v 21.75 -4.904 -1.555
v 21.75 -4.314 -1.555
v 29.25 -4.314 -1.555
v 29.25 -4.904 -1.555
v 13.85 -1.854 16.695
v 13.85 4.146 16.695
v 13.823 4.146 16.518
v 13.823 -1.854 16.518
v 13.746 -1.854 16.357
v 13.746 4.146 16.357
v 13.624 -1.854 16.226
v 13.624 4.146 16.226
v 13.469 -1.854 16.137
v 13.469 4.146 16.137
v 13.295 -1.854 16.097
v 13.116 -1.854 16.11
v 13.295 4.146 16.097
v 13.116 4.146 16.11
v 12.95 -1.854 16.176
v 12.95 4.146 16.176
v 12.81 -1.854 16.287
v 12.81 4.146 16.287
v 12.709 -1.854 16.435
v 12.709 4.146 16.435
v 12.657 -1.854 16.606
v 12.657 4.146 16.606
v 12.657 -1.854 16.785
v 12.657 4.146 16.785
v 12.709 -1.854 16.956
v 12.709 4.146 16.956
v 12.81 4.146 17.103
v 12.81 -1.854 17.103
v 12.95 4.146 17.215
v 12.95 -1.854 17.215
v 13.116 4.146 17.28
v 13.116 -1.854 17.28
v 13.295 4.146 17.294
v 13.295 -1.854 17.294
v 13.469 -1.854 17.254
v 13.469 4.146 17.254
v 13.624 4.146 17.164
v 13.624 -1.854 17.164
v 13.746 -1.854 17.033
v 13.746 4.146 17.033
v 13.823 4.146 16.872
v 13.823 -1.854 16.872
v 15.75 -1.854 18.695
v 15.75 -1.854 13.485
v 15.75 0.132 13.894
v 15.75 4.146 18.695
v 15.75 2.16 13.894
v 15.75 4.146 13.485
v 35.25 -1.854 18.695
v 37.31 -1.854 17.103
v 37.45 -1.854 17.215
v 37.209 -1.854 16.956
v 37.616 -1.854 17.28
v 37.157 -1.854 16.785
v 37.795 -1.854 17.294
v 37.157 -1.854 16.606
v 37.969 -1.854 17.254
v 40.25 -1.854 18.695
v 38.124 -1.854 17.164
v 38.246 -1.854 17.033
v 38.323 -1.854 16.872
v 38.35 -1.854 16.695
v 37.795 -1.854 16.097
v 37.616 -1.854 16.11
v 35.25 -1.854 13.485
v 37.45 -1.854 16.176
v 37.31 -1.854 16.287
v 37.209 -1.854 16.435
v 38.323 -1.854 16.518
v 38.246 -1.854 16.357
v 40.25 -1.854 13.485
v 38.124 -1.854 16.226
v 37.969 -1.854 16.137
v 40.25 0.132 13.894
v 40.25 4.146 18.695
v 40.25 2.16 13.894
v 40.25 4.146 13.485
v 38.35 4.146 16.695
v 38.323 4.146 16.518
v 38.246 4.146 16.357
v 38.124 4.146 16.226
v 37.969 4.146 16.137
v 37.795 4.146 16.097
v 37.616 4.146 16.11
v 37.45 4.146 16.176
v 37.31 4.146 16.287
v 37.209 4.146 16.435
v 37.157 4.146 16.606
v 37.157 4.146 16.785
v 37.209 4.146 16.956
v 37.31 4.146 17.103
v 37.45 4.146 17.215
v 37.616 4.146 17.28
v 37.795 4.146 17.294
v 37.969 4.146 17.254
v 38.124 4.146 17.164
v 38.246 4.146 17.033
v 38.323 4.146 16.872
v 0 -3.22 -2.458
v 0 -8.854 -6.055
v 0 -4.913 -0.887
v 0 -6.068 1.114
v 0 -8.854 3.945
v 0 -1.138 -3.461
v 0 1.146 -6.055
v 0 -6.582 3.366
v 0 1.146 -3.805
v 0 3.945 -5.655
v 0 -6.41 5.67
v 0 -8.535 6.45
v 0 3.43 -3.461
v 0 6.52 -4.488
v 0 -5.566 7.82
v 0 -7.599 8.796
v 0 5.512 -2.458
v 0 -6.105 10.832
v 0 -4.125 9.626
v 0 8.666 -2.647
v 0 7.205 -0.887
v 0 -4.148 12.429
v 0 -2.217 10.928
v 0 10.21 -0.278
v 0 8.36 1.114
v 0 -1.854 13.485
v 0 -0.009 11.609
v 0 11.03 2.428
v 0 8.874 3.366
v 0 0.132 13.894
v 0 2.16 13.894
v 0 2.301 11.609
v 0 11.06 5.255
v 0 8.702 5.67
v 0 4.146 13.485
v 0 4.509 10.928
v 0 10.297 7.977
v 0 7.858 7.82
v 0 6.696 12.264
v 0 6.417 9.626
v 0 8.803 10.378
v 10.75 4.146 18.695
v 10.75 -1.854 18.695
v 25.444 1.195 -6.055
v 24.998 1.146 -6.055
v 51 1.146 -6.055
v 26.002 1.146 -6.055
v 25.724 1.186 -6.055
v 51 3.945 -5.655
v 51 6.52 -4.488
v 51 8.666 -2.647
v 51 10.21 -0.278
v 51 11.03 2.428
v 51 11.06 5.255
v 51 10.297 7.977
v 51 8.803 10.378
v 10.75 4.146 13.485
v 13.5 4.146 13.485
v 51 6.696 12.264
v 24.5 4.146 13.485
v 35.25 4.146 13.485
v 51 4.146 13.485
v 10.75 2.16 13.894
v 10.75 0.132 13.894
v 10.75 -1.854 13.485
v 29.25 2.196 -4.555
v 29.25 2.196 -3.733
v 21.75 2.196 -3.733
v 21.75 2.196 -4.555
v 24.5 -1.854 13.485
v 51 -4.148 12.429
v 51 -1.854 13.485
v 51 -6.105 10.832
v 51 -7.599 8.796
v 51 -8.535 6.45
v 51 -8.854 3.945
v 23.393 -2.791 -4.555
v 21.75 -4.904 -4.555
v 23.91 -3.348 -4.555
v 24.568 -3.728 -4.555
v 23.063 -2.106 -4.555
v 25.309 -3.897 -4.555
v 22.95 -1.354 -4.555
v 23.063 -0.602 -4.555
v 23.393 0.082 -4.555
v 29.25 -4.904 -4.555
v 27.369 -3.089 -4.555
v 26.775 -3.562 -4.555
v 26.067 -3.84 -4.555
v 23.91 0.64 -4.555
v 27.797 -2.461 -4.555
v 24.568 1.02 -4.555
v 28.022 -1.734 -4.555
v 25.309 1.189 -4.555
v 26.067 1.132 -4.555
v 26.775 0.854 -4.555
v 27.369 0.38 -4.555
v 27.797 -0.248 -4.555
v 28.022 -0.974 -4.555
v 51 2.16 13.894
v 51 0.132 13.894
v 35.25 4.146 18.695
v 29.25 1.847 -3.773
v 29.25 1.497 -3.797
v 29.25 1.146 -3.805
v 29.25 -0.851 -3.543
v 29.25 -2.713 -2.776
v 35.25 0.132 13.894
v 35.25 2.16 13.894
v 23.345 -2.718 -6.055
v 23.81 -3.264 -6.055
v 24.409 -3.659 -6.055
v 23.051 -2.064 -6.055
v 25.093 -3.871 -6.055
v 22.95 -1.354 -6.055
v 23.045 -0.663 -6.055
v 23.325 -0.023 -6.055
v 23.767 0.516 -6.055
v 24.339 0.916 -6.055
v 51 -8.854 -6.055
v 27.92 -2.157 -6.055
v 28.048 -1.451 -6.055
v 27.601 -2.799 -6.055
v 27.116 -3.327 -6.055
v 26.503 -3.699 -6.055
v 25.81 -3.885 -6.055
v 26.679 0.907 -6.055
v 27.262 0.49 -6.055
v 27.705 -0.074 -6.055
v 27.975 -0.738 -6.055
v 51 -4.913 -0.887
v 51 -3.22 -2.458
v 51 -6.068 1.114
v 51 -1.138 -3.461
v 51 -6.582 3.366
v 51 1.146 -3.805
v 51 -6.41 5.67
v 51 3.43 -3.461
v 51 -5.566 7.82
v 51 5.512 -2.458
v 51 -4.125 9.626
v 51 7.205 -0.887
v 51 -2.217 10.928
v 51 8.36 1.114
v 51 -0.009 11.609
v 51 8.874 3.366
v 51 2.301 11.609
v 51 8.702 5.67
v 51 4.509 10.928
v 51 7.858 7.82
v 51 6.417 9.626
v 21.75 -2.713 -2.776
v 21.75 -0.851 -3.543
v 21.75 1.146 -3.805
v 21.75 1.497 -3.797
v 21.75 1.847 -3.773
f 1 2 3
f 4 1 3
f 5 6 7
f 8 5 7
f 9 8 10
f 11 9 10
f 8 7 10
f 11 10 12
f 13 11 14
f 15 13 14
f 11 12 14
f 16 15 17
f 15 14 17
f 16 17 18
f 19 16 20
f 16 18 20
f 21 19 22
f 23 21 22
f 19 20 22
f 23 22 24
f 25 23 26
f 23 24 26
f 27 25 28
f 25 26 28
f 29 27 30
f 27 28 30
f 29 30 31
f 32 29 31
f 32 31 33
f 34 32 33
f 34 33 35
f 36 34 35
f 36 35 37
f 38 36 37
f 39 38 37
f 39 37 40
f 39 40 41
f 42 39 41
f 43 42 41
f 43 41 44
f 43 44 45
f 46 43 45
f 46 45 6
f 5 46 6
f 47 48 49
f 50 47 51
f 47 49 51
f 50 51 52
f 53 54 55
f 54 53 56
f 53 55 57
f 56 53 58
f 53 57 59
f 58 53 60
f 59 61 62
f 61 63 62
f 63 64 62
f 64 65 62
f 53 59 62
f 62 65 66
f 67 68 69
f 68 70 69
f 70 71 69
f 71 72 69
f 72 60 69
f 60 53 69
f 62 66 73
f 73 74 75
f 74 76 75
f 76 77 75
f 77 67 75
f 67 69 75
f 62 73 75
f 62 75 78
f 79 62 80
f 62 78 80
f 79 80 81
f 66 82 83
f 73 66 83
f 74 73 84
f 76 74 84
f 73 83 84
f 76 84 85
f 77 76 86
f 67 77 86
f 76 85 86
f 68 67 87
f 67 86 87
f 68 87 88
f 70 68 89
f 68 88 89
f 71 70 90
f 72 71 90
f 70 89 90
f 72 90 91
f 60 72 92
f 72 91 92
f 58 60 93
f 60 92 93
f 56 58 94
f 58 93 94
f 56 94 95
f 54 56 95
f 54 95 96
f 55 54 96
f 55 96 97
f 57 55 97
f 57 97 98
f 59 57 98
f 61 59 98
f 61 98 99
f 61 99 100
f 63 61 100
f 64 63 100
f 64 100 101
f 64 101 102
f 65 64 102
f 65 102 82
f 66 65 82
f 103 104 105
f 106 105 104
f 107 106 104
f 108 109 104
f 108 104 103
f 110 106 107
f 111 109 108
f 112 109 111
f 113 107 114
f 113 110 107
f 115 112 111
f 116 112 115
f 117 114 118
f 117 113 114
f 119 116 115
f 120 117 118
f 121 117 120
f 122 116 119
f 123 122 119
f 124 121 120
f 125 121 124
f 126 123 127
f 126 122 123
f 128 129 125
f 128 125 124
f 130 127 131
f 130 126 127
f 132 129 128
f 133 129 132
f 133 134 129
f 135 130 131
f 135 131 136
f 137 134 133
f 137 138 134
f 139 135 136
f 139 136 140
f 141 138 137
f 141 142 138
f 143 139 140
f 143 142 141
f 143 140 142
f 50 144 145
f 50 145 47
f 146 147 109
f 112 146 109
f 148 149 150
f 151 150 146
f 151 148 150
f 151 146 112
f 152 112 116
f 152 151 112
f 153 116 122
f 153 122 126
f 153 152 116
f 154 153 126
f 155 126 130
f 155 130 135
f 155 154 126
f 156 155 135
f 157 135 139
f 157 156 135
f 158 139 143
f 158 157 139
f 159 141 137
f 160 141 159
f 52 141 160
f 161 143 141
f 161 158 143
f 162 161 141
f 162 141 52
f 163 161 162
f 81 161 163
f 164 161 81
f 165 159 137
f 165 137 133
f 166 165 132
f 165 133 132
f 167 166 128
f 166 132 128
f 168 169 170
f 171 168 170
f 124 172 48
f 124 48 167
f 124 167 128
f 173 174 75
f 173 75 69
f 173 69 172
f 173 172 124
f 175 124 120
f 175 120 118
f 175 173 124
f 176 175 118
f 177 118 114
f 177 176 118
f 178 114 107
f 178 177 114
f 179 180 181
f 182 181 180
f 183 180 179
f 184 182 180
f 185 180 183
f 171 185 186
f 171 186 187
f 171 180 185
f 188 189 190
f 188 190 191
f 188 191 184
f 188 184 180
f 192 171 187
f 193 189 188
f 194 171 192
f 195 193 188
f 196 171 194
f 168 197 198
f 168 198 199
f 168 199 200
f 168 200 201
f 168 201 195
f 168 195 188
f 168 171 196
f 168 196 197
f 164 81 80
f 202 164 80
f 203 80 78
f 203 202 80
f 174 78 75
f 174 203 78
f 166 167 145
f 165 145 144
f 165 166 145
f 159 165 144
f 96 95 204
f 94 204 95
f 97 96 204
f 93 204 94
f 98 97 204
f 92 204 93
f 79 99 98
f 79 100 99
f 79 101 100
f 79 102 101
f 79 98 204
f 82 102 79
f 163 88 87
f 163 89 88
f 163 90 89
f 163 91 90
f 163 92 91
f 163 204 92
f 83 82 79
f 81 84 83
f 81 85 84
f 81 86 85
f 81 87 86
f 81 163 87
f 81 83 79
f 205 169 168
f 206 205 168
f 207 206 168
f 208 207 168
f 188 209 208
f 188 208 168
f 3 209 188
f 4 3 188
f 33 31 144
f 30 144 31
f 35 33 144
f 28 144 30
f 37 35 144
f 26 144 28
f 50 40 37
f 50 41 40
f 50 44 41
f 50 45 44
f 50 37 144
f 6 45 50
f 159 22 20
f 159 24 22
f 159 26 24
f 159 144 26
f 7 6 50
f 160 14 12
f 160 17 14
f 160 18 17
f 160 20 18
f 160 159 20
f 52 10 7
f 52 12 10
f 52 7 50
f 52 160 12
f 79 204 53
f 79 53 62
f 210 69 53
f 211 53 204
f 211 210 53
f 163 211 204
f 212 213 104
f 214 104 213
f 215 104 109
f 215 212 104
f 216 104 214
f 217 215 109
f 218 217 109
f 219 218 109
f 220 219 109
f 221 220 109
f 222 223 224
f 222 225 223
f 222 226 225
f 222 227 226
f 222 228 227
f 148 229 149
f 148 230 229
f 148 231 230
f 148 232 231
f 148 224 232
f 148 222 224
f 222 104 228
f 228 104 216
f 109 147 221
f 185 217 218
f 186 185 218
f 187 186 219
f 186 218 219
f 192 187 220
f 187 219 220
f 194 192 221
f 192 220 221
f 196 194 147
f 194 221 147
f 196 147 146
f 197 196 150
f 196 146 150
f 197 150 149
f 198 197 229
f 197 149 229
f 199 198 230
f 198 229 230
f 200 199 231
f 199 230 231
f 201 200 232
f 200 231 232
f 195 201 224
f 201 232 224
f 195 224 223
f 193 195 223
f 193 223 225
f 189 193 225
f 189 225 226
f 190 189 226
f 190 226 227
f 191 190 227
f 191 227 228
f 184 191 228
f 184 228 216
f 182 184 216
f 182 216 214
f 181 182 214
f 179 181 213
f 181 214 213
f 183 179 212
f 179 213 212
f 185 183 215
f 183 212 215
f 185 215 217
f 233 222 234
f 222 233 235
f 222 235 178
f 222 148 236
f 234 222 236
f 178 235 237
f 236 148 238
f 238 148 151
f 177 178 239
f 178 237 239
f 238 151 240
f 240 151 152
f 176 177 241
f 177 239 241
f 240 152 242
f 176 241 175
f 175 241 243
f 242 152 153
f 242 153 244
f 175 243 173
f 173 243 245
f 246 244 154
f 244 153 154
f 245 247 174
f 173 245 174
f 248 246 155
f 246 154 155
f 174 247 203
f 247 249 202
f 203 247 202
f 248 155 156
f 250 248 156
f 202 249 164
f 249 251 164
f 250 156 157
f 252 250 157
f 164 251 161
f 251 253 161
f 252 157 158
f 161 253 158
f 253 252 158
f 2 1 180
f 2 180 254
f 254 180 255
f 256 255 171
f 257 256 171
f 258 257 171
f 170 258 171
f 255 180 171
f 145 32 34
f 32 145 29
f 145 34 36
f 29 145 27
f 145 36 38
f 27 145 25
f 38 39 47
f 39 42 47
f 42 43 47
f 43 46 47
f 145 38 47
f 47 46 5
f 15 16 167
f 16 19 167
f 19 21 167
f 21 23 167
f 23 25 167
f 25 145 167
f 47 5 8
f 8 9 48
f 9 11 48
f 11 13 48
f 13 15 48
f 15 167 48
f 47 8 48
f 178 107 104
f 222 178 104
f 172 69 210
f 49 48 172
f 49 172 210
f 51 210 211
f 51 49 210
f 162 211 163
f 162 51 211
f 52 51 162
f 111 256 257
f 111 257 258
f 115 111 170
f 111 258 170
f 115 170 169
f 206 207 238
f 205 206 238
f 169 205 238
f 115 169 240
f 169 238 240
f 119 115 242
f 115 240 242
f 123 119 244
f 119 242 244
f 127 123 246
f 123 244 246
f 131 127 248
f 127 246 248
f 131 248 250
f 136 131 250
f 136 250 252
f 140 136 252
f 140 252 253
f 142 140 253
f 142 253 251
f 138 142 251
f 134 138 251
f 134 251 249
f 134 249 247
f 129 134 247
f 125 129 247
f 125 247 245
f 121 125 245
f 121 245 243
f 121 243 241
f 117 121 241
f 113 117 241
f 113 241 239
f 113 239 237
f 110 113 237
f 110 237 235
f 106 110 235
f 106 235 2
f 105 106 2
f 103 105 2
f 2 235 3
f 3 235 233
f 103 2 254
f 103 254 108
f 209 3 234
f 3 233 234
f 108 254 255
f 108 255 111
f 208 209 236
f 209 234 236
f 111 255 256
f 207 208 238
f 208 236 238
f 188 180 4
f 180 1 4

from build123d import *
from build123d.topology import SkipClean

# Parameters (mm, degrees)
SKETCH1_W                = 34
SKETCH1_H                = 30
BOSS_EXTRUDE2_DEPTH      = 51
SKETCH3_R                = 2.55
CUT_EXTRUDE3_DEPTH       = 10
SKETCH5_R                = 7.75
CUT_EXTRUDE4_DEPTH       = 51
SKETCH6_W                = 7
SKETCH6_H                = 30
CUT_EXTRUDE6_DEPTH       = 51
CUT_EXTRUDE7_DEPTH       = 51
CUT_EXTRUDE9_DEPTH       = 1.5
CUT_EXTRUDE9_DEPTH_BACK  = 1.5
BOSS_EXTRUDE5_DEPTH      = 51
CUT_EXTRUDE10_DEPTH      = 13
CUT_EXTRUDE11_START      = -13
CUT_EXTRUDE11_DEPTH      = 13
SKETCH13_W               = 2
SKETCH13_H               = 6
CUT_EXTRUDE12_DEPTH      = 2
CUT_EXTRUDE13_DEPTH      = 13
CUT_EXTRUDE13_DEPTH_BACK = 11
BOSS_EXTRUDE6_DEPTH      = 2.25
BOSS_EXTRUDE7_DEPTH      = 2.25
BOSS_EXTRUDE8_DEPTH      = 2.25
BOSS_EXTRUDE9_DEPTH      = 2.25
SKETCH22_W               = 5
SKETCH22_H               = 6
BOSS_EXTRUDE10_DEPTH     = 1
SKETCH24_W               = 5
SKETCH24_H               = 6
BOSS_EXTRUDE11_DEPTH     = 1
SKETCH25_R               = 0.6
CUT_EXTRUDE14_DEPTH      = 20


with BuildPart() as part:
    # Sketch1 → Boss-Extrude2 (new body)
    with BuildSketch(Plane(origin=(0, 0, 0), x_dir=(0, 0, -1), z_dir=(1, 0, 0))):
        with Locations((-3.945183177, 6.145902028)):
            Rectangle(SKETCH1_W, SKETCH1_H)
    extrude(amount=BOSS_EXTRUDE2_DEPTH)

    # Sketch3 → Cut-Extrude3 (cut)
    with BuildSketch(Plane(origin=(0, 0, -13.054816823), x_dir=(-1, 0, 0), z_dir=(0, 0, -1))):
        with Locations((-25.5, -1.354097972)):
            Circle(SKETCH3_R)
    extrude(amount=-CUT_EXTRUDE3_DEPTH, mode=Mode.SUBTRACT)

    # Sketch5 → Cut-Extrude4 (cut)
    with BuildSketch(Plane(origin=(51, 0, 0), x_dir=(0, 0, -1), z_dir=(1, 0, 0))):
        with Locations((-3.945183177, 1.145902028)):
            Circle(SKETCH5_R)
    extrude(amount=-CUT_EXTRUDE4_DEPTH, mode=Mode.SUBTRACT)

    # Sketch6 → Cut-Extrude6 (cut)
    with BuildSketch(Plane(origin=(51, 0, 0), x_dir=(0, 0, -1), z_dir=(1, 0, 0))):
        with Locations((9.554816823, 6.145902028)):
            Rectangle(SKETCH6_W, SKETCH6_H)
    extrude(amount=-CUT_EXTRUDE6_DEPTH, mode=Mode.SUBTRACT)

    # Sketch7 → Cut-Extrude7 (cut)
    with BuildSketch(Plane(origin=(51, 0, 0), x_dir=(0, 0, -1), z_dir=(1, 0, 0))):
        with BuildLine():
            Line((-3.945183177, -8.854097972), (-20.945183177, -8.854097972))
            Line((-20.945183177, -8.854097972), (-20.945183177, 21.145902028))
            Line((-20.945183177, 21.145902028), (6.054816823, 21.145902028))
            Line((6.054816823, 21.145902028), (6.054816823, 1.145902028))
            ThreePointArc((6.054816823, 1.145902028), (-11.016250989, 8.21696984), (-3.945183177, -8.854097972))
        make_face()
    extrude(amount=-CUT_EXTRUDE7_DEPTH, mode=Mode.SUBTRACT)

    # Sketch8 → Cut-Extrude9 (cut, two sides: drawn at the far end of the back side and taken through both)
    with BuildSketch(Plane(origin=(0, 0, -3.054816823), x_dir=(-1, 0, 0), z_dir=(0, 0, -1)).offset(-CUT_EXTRUDE9_DEPTH_BACK)):
        Polygon((-21.75, -2.180131646), (-21.75, -4.904097972), (-29.25, -4.904097972), (-29.25, -2.180131646), (-29.25, 2.195902028), (-21.75, 2.195902028), align=None)
    extrude(amount=CUT_EXTRUDE9_DEPTH + CUT_EXTRUDE9_DEPTH_BACK, mode=Mode.SUBTRACT)

    # Sketch10 → Boss-Extrude5 (add)
    with BuildSketch(Plane(origin=(51, 0, 0), x_dir=(0, 0, -1), z_dir=(1, 0, 0))):
        Polygon((-17.695183177, 1.145902028), (-17.695183177, 4.145902028), (-11.695183177, 4.145902028), (-11.695183177, 1.145902028), (-11.695183177, -1.854097972), (-17.695183177, -1.854097972), align=None)
    extrude(amount=-BOSS_EXTRUDE5_DEPTH)

    # Sketch11 → Cut-Extrude10 (cut)
    with BuildSketch(Plane(origin=(51, 0, 0), x_dir=(0, 0, -1), z_dir=(1, 0, 0))):
        with BuildLine():
            Line((-13.484575191, -1.854097972), (-17.695183177, -1.854097972))
            Line((-17.695183177, -1.854097972), (-17.695183177, 4.145902028))
            Line((-17.695183177, 4.145902028), (-13.484575191, 4.145902028))
            ThreePointArc((-13.484575191, 4.145902028), (-13.945183177, 1.145902028), (-13.484575191, -1.854097972))
        make_face()
    extrude(amount=-CUT_EXTRUDE10_DEPTH, mode=Mode.SUBTRACT)

    # Sketch12 → Cut-Extrude11 (cut)
    with BuildSketch(Plane.ZY.offset(CUT_EXTRUDE11_START)):
        with BuildLine():
            Line((13.484575191, -1.854097972), (17.695183177, -1.854097972))
            Line((17.695183177, -1.854097972), (17.695183177, 4.145902028))
            Line((17.695183177, 4.145902028), (13.484575191, 4.145902028))
            ThreePointArc((13.484575191, 4.145902028), (13.945183177, 1.145902028), (13.484575191, -1.854097972))
        make_face()
    extrude(amount=CUT_EXTRUDE11_DEPTH, mode=Mode.SUBTRACT)

    # Sketch13 → Cut-Extrude12 (cut)
    with BuildSketch(Plane.XY.offset(17.695183177)):
        with Locations((25.5, 1.145902028)):
            Rectangle(SKETCH13_W, SKETCH13_H)
    extrude(amount=-CUT_EXTRUDE12_DEPTH, mode=Mode.SUBTRACT)

    # Sketch15 → Cut-Extrude13 (cut, two sides: drawn at the far end of the back side and taken through both)
    with SkipClean():  # the faces are left unmerged after this step: merging them gives an invalid solid
        with BuildSketch(Plane(origin=(24.5, 0, 0), x_dir=(0, 0, -1), z_dir=(1, 0, 0)).offset(-CUT_EXTRUDE13_DEPTH_BACK)):
            with BuildLine():
                Line((-17.695183177, 4.145902028), (-17.695183177, -1.854097972))
                Line((-17.695183177, -1.854097972), (-13.484575191, -1.854097972))
                ThreePointArc((-13.484575191, -1.854097972), (-13.945183177, 1.145902028), (-13.484575191, 4.145902028))
                Line((-13.484575191, 4.145902028), (-17.695183177, 4.145902028))
            make_face()
        extrude(amount=CUT_EXTRUDE13_DEPTH + CUT_EXTRUDE13_DEPTH_BACK, mode=Mode.SUBTRACT)

    # Sketch17 → Boss-Extrude6 (add)
    with SkipClean():  # the faces are left unmerged after this step: merging them gives an invalid solid
        with BuildSketch(Plane(origin=(38, 0, 0), x_dir=(0, 0, -1), z_dir=(1, 0, 0))):
            with BuildLine():
                Line((-13.484575191, 4.145902028), (-17.695183177, 4.145902028))
                Line((-17.695183177, 4.145902028), (-17.695183177, -1.854097972))
                Line((-17.695183177, -1.854097972), (-13.484575191, -1.854097972))
                ThreePointArc((-13.484575191, -1.854097972), (-13.945183177, 1.145902028), (-13.484575191, 4.145902028))
            make_face()
        extrude(amount=BOSS_EXTRUDE6_DEPTH)

    # Sketch19 → Boss-Extrude7 (add)
    with SkipClean():  # the faces are left unmerged after this step: merging them gives an invalid solid
        with BuildSketch(Plane.ZY.offset(-13)):
            with BuildLine():
                Line((13.484575191, 4.145902028), (17.695183177, 4.145902028))
                Line((17.695183177, 4.145902028), (17.695183177, -1.854097972))
                Line((17.695183177, -1.854097972), (13.484575191, -1.854097972))
                ThreePointArc((13.484575191, -1.854097972), (13.945183177, 1.145902028), (13.484575191, 4.145902028))
            make_face()
        extrude(amount=BOSS_EXTRUDE7_DEPTH)

    # Sketch20 → Boss-Extrude8 (add)
    with SkipClean():  # the faces are left unmerged after this step: merging them gives an invalid solid
        with BuildSketch(Plane(origin=(13.5, 0, 0), x_dir=(0, 0, -1), z_dir=(1, 0, 0))):
            with BuildLine():
                Line((-17.695183177, -1.854097972), (-17.695183177, 4.145902028))
                Line((-17.695183177, 4.145902028), (-13.484575191, 4.145902028))
                ThreePointArc((-13.484575191, 4.145902028), (-13.945183177, 1.145902028), (-13.484575191, -1.854097972))
                Line((-13.484575191, -1.854097972), (-17.695183177, -1.854097972))
            make_face()
        extrude(amount=BOSS_EXTRUDE8_DEPTH)

    # Sketch21 → Boss-Extrude9 (add)
    with SkipClean():  # the faces are left unmerged after this step: merging them gives an invalid solid
        with BuildSketch(Plane.ZY.offset(-37.5)):
            with BuildLine():
                Line((13.484575191, 4.145902028), (17.695183177, 4.145902028))
                Line((17.695183177, 4.145902028), (17.695183177, -1.854097972))
                Line((17.695183177, -1.854097972), (13.484575191, -1.854097972))
                ThreePointArc((13.484575191, -1.854097972), (13.945183177, 1.145902028), (13.484575191, 4.145902028))
            make_face()
        extrude(amount=BOSS_EXTRUDE9_DEPTH)

    # Sketch22 → Boss-Extrude10 (add)
    with SkipClean():  # the faces are left unmerged after this step: merging them gives an invalid solid
        with BuildSketch(Plane.XY.offset(17.695183177)):
            with Locations((37.75, 1.145902028)):
                Rectangle(SKETCH22_W, SKETCH22_H)
        extrude(amount=BOSS_EXTRUDE10_DEPTH)

    # Sketch24 → Boss-Extrude11 (add)
    with SkipClean():  # the faces are left unmerged after this step: merging them gives an invalid solid
        with BuildSketch(Plane.XY.offset(17.695183177)):
            with Locations((13.25, 1.145902028)):
                Rectangle(SKETCH24_W, SKETCH24_H)
        extrude(amount=BOSS_EXTRUDE11_DEPTH)

    # Sketch25 → Cut-Extrude14 (cut)
    with SkipClean():  # the faces are left unmerged after this step: merging them gives an invalid solid
        with BuildSketch(Plane(origin=(0, 4.145902028, 0), x_dir=(1, 0, 0), z_dir=(0, 1, 0))):
            with Locations((13.25, -16.695183177)):
                Circle(SKETCH25_R)
            with Locations((37.75, -16.695183177)):
                Circle(SKETCH25_R)
        extrude(amount=-CUT_EXTRUDE14_DEPTH, mode=Mode.SUBTRACT)


solid = part.part
